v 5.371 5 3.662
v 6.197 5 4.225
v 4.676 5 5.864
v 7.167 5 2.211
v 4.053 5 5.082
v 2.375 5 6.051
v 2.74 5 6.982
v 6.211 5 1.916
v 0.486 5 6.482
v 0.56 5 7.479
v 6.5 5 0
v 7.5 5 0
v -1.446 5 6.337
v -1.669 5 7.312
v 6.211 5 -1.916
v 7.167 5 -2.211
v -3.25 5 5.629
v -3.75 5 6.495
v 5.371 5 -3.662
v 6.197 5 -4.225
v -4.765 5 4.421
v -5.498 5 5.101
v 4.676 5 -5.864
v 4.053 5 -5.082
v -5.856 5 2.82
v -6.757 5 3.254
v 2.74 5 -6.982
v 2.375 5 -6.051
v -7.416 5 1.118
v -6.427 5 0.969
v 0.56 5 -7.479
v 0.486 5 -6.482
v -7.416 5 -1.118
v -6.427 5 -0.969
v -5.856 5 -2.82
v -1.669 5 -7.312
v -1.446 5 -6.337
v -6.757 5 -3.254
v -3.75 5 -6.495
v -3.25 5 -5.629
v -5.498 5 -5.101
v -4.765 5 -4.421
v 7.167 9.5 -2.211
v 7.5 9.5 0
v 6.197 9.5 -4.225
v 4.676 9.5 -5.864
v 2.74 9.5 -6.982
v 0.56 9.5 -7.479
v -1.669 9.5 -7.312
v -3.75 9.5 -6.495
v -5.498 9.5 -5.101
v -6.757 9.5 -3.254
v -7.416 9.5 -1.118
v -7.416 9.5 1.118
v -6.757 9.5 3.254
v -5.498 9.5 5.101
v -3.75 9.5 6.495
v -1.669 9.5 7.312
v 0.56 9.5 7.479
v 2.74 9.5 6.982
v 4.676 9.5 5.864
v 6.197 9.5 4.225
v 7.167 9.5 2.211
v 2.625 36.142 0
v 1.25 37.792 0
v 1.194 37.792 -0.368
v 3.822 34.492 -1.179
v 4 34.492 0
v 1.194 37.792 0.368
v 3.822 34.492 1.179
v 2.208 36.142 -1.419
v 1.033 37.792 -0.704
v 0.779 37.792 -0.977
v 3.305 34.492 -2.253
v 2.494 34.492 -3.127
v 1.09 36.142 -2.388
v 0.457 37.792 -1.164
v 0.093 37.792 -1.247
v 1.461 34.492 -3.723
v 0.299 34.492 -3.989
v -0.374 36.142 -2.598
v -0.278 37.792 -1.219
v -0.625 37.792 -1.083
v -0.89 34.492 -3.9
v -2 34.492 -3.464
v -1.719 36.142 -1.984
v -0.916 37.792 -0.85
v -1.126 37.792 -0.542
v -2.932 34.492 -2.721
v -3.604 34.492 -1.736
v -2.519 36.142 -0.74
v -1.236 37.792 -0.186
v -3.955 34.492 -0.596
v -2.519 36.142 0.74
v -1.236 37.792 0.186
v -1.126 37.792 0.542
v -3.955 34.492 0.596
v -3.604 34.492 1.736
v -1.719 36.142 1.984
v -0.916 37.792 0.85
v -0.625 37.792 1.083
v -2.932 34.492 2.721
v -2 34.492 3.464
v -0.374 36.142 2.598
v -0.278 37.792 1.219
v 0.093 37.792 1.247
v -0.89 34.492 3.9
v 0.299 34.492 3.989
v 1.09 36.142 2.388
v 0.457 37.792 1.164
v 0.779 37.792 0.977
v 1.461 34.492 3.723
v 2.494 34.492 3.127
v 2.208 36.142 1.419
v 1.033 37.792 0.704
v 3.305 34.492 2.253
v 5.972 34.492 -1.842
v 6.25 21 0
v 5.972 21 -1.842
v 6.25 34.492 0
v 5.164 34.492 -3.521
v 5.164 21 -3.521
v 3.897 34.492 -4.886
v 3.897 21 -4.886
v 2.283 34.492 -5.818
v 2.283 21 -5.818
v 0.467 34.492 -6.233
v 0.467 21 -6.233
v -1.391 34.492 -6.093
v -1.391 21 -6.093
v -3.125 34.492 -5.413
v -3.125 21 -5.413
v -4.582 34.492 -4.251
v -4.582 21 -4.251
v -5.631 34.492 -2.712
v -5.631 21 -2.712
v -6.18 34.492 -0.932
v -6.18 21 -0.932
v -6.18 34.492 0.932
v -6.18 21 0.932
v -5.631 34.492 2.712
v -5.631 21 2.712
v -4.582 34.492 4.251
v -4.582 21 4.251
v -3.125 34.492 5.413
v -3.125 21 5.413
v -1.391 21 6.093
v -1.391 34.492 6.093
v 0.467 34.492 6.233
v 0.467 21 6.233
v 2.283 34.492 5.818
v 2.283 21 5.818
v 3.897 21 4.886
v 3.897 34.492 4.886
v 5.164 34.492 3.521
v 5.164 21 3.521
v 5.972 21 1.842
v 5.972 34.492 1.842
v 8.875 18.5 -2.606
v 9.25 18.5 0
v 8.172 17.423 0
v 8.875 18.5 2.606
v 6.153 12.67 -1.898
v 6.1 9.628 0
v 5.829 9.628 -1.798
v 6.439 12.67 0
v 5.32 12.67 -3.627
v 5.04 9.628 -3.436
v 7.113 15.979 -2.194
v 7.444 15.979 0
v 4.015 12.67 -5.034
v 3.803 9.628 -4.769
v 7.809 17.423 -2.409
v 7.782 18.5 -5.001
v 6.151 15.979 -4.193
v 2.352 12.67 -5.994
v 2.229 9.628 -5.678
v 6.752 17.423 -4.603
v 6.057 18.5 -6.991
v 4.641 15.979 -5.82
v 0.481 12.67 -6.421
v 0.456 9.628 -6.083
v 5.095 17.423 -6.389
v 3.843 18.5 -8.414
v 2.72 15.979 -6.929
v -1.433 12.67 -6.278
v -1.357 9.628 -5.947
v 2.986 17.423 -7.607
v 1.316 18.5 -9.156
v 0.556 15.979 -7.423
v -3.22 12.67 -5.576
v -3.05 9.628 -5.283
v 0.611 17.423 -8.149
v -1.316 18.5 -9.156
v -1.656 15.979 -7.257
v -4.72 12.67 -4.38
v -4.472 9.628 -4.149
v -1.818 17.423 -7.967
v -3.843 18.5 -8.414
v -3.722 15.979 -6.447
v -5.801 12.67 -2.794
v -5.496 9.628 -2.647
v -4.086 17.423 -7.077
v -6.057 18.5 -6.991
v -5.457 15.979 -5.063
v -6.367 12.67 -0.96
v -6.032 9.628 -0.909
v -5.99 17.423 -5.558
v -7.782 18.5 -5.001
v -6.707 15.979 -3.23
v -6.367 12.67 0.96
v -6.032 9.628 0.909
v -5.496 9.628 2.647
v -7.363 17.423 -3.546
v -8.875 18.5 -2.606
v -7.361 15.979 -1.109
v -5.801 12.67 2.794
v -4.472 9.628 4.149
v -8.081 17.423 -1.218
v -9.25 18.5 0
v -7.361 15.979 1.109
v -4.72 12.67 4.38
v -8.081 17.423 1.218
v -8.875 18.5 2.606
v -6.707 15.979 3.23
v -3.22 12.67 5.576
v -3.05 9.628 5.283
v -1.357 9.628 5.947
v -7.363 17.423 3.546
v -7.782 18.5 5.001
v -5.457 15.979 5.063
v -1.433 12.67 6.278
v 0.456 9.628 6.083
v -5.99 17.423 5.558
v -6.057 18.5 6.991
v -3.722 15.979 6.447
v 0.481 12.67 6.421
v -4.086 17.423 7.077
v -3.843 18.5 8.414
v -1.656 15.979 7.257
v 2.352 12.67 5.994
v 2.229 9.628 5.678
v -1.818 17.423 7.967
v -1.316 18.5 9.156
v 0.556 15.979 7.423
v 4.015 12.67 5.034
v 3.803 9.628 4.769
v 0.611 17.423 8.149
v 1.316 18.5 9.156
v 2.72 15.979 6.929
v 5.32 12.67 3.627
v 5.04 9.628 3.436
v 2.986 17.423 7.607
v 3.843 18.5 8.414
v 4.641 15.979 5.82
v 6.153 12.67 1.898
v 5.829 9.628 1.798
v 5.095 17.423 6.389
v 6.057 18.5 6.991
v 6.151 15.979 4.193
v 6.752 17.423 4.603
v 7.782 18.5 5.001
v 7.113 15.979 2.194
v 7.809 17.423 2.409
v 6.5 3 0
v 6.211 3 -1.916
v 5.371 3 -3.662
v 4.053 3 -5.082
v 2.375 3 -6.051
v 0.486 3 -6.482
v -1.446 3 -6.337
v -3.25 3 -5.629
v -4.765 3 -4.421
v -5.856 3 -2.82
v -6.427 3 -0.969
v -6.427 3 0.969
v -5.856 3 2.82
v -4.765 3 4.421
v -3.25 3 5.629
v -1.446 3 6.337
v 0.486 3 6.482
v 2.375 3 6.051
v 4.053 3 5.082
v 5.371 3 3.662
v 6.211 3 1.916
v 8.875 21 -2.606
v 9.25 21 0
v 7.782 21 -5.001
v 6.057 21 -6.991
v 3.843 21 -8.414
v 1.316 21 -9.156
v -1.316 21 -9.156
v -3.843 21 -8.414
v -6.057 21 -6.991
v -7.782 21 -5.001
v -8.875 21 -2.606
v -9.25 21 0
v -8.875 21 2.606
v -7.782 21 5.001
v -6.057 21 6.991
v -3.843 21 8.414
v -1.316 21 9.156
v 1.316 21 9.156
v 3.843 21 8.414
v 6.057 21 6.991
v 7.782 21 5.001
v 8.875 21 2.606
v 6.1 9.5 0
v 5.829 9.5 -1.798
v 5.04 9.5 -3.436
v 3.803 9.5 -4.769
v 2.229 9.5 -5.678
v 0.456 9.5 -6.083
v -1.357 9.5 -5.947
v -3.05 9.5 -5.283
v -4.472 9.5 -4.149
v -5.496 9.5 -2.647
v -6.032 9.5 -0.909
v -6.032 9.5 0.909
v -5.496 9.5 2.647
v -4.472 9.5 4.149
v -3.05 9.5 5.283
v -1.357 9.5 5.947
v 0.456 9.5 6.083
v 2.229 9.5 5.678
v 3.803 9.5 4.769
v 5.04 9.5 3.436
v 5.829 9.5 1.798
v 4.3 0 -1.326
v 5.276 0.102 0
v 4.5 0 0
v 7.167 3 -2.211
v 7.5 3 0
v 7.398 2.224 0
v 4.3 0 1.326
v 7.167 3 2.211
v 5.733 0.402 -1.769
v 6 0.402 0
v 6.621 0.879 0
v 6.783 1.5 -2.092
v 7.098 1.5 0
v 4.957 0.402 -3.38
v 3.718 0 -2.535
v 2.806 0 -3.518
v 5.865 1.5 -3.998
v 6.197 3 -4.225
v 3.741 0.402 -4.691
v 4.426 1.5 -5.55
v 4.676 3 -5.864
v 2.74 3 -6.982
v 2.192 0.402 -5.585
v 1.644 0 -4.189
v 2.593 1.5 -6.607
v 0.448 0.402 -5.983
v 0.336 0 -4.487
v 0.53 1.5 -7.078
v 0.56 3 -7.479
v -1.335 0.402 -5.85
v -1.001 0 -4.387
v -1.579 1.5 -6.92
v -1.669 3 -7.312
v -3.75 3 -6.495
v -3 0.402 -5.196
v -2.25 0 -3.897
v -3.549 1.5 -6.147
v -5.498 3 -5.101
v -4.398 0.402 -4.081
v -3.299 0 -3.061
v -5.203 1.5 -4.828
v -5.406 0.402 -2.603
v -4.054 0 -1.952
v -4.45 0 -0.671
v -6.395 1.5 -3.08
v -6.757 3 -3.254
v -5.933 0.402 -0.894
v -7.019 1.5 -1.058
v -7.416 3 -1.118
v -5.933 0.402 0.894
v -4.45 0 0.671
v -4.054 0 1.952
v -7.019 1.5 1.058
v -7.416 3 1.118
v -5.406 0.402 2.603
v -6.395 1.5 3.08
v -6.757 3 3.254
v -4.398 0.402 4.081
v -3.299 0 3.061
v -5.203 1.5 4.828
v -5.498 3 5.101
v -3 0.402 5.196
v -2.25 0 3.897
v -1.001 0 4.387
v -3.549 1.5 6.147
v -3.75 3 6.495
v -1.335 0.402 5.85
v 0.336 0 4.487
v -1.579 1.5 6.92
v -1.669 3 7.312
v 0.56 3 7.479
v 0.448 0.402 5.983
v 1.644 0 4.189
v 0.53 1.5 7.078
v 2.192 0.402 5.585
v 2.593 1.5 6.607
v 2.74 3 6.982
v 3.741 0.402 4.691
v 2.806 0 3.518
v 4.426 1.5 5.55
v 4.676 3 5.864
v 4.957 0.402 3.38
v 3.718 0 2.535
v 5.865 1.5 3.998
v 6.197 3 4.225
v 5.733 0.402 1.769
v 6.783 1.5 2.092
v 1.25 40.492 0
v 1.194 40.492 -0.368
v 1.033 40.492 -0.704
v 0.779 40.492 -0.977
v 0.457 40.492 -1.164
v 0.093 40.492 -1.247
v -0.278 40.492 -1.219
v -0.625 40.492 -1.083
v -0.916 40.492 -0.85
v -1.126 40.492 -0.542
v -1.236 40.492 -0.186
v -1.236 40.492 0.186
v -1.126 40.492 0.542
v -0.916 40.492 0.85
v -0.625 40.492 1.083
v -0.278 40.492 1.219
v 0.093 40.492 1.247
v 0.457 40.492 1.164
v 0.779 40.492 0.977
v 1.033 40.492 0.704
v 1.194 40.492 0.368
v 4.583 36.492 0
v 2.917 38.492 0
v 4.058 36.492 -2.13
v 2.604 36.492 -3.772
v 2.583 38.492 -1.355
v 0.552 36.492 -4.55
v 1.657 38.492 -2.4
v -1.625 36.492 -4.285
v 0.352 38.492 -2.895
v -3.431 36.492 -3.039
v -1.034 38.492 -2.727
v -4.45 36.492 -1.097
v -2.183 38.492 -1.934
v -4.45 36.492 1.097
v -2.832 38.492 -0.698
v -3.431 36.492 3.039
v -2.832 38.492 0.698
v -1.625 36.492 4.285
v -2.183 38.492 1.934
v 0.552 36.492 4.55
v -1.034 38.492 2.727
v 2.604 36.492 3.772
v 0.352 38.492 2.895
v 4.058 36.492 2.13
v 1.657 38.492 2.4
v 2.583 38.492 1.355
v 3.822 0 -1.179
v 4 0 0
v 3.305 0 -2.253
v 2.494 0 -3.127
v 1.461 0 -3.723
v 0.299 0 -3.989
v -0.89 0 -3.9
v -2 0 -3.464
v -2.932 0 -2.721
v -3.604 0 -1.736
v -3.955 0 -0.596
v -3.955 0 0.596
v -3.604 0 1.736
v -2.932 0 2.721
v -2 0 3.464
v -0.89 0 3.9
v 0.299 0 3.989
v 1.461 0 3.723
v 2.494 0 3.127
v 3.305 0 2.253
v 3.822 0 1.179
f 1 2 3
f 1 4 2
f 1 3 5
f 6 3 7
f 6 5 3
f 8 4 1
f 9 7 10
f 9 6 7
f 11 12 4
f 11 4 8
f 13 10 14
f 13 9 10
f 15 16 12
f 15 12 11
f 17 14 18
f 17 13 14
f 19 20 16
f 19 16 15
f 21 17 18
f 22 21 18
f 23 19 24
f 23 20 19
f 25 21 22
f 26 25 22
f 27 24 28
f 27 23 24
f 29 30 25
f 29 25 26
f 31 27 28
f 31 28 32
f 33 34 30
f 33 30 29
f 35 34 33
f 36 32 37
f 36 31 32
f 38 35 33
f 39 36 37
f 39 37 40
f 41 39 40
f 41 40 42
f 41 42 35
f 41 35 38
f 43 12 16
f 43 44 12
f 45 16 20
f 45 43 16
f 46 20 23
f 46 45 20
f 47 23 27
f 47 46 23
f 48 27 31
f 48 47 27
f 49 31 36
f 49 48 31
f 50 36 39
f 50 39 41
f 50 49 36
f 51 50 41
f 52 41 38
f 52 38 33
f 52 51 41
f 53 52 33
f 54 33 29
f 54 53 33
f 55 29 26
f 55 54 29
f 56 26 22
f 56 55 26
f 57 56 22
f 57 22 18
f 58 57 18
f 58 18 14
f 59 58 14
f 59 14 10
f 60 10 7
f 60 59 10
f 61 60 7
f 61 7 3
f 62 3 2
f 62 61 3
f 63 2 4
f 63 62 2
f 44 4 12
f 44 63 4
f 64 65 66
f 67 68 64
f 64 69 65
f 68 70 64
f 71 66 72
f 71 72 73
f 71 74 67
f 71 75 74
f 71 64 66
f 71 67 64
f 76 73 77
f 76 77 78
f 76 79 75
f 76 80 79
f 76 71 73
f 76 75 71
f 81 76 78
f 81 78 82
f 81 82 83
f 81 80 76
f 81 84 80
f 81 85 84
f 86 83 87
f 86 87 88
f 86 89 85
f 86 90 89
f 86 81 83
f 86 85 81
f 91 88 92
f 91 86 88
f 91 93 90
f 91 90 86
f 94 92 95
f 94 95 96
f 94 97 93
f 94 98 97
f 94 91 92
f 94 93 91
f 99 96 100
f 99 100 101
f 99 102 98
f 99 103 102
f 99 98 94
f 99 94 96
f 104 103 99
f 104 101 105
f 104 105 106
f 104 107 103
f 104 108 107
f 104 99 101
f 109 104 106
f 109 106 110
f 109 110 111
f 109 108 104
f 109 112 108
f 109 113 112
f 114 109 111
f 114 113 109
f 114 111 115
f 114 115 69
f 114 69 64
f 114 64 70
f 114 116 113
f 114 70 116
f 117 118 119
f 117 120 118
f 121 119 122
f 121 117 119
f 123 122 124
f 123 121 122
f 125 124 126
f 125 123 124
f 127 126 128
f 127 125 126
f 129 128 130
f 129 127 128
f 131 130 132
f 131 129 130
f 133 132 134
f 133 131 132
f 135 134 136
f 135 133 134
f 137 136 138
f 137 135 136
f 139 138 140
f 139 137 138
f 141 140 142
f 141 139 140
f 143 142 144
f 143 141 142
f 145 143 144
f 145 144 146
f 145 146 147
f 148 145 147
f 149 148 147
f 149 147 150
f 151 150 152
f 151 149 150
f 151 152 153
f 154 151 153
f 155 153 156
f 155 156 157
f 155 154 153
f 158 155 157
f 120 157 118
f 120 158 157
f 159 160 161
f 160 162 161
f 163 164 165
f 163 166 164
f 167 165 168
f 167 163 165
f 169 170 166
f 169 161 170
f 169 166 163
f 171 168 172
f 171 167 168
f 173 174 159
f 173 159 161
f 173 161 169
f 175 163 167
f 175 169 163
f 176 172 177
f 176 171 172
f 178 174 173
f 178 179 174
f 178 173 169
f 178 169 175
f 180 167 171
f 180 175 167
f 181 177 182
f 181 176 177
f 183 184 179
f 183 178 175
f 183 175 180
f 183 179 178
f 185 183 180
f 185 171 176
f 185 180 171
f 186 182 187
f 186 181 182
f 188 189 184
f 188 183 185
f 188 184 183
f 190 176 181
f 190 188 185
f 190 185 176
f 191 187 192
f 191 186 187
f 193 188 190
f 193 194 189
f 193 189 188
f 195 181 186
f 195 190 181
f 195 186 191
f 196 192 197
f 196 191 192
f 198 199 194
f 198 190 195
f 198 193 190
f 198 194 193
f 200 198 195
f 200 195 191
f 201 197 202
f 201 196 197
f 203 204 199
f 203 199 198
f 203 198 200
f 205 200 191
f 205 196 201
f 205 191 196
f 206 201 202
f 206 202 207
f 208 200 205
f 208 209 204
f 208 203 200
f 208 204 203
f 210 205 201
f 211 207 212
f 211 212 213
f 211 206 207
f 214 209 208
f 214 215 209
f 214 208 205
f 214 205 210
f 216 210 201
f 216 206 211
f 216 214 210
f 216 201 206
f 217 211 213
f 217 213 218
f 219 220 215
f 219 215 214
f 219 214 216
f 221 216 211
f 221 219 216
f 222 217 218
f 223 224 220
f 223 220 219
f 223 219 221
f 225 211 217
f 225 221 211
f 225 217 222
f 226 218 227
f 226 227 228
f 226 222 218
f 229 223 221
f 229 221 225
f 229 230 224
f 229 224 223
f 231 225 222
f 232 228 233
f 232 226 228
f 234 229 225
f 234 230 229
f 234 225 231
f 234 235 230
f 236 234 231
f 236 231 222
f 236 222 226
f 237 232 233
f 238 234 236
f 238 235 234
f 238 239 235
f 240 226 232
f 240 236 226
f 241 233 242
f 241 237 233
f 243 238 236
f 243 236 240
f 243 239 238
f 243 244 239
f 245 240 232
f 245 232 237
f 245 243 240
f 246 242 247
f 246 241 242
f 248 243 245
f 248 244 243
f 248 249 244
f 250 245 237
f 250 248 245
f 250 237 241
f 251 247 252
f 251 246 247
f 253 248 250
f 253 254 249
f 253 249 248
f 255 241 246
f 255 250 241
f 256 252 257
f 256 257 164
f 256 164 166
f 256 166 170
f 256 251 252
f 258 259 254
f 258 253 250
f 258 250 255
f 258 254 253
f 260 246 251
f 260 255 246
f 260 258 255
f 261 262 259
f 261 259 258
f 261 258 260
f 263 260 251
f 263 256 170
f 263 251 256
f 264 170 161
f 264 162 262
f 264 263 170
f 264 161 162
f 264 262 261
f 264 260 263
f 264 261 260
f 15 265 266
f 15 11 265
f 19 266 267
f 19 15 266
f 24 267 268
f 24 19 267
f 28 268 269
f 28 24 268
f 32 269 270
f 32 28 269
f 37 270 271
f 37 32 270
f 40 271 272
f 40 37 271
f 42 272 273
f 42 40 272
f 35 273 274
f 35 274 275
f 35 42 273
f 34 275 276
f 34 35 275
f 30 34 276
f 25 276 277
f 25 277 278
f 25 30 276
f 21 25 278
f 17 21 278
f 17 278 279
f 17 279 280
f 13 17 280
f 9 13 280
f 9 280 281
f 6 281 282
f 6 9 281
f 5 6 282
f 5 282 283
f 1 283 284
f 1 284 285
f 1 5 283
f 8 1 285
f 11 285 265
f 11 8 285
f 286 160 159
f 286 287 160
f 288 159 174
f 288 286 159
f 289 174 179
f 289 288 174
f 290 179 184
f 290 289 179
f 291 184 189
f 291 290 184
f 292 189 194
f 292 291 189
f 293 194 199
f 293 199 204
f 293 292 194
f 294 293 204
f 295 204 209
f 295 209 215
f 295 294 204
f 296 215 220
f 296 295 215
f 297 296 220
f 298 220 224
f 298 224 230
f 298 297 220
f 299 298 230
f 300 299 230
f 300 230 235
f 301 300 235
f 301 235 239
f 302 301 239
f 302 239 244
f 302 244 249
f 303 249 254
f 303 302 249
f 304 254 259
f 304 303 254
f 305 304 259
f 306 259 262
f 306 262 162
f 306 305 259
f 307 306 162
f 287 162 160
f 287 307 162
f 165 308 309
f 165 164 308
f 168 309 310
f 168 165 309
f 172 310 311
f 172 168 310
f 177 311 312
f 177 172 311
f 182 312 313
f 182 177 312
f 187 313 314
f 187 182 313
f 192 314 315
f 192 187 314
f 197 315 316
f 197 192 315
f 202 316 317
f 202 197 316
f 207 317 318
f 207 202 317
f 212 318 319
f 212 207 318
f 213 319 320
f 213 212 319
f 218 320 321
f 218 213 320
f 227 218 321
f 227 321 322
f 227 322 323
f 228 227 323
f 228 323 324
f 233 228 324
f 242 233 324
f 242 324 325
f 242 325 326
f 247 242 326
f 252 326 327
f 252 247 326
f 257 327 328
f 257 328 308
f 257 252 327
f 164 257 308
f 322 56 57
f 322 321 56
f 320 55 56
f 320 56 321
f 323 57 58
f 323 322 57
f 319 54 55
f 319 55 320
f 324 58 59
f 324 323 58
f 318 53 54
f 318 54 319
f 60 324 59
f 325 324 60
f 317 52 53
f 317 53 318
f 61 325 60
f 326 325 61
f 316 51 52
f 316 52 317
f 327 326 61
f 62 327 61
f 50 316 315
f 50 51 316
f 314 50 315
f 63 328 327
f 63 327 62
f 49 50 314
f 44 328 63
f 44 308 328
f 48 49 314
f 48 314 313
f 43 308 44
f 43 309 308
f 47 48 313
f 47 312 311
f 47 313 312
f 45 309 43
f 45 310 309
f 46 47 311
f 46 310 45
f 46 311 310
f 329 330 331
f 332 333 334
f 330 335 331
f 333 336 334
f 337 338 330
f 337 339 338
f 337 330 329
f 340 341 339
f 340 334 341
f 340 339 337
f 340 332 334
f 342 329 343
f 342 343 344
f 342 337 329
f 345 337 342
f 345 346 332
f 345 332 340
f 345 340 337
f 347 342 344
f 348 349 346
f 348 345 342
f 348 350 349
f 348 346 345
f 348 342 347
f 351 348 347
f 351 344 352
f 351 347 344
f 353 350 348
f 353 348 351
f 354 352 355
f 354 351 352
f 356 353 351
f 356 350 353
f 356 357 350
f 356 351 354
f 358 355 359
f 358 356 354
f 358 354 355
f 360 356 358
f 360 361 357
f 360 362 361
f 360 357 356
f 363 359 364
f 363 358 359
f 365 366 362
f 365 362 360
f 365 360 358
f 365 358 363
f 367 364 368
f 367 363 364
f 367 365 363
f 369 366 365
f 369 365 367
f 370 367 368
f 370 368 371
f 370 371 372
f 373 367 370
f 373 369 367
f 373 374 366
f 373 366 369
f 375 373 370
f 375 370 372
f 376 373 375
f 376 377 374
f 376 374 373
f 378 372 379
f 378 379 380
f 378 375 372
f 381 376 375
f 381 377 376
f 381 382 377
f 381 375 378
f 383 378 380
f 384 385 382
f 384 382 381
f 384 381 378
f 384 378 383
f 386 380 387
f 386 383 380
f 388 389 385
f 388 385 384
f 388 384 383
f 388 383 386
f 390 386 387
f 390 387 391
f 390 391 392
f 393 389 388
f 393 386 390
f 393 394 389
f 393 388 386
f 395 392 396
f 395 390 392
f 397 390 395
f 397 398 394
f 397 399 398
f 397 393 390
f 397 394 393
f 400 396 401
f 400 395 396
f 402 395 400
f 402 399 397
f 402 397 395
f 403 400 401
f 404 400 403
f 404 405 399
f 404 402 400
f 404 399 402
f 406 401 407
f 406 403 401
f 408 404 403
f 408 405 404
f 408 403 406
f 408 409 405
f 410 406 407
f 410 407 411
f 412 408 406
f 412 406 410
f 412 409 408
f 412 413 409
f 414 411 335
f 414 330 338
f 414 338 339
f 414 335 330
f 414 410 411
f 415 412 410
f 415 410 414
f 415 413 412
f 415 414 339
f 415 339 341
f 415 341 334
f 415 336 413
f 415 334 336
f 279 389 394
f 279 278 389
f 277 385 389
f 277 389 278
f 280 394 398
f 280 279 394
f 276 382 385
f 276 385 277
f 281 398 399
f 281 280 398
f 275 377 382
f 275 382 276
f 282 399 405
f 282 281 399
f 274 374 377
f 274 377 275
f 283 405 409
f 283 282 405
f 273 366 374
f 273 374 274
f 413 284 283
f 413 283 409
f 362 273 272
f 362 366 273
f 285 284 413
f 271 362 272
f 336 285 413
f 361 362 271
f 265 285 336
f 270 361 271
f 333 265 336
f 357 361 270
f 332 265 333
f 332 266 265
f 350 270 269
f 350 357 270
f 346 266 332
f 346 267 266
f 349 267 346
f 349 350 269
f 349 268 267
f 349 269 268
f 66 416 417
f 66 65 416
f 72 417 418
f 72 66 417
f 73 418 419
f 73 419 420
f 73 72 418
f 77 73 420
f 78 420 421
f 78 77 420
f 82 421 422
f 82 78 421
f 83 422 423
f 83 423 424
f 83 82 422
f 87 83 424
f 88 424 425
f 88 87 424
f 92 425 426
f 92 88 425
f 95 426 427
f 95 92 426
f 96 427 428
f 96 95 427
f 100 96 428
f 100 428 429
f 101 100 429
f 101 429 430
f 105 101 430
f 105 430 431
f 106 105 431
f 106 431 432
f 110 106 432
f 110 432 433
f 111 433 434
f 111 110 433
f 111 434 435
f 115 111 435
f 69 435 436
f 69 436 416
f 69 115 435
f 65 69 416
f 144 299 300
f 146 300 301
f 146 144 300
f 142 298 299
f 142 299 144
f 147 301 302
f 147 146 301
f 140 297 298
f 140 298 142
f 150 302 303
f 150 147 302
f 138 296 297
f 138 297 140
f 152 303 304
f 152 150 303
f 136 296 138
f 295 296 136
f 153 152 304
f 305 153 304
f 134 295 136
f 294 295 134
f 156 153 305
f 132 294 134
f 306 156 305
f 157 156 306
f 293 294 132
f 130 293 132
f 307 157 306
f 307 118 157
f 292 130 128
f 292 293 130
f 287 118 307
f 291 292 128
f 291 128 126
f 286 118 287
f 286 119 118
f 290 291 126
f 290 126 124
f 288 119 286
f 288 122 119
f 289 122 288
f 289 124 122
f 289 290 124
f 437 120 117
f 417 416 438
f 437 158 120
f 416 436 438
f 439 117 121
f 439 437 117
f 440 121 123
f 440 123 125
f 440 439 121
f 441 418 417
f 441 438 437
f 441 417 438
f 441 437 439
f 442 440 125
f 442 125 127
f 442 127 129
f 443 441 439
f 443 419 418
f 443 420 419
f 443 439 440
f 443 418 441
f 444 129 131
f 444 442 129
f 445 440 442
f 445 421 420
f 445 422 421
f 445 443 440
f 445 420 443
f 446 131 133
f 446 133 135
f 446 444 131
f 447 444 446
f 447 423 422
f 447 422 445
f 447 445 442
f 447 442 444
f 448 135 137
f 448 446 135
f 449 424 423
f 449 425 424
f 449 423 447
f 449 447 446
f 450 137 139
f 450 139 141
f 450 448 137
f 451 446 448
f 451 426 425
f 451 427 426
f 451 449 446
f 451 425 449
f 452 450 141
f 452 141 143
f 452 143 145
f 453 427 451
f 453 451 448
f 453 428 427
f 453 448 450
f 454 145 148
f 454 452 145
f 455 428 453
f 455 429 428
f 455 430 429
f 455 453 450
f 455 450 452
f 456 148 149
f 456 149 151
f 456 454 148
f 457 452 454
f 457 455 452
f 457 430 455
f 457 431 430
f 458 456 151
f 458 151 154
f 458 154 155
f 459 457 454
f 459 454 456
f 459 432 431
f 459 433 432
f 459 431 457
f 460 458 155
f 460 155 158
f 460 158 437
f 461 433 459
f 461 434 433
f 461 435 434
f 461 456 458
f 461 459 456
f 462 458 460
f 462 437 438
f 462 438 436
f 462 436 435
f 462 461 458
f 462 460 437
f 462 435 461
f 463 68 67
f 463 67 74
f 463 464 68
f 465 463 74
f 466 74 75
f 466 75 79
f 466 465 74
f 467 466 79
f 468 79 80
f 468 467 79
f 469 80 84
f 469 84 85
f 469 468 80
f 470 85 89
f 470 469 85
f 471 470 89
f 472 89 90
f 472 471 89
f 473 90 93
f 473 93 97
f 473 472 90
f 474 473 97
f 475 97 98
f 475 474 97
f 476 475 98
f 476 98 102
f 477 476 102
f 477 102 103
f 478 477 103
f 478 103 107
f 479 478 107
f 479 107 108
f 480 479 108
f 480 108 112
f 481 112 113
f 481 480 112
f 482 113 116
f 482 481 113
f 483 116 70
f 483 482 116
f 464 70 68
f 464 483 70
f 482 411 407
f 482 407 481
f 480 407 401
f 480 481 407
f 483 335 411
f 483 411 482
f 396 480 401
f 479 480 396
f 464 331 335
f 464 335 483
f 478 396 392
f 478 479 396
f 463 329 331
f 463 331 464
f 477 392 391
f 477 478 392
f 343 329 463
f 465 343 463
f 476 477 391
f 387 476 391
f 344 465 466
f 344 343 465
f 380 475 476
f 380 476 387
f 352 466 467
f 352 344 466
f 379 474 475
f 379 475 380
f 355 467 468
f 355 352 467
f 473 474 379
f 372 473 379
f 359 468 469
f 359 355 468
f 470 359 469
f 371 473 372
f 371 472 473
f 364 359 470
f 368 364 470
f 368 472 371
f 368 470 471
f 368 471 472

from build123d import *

# Parameters (mm, degrees)
F0_W = 2.25
F0_H = 10.4924628735
F2_R = 2.99999


# Not quite as in the source:
# - a fillet or chamfer is up to 0.001 mm smaller than in the source, because OpenCascade refuses the exact size


with BuildPart() as f1:
    # F0 (on Top) → F1 (revolve)
    with BuildSketch(Plane.XY):
        with BuildLine():
            Line((4, 10), (4, 0))
            Line((4, 0), (7.5, 0))
            Line((7.5, 0), (7.5, 3))
            Line((7.5, 3), (6.5, 3))
            Line((6.5, 3), (6.5, 5))
            Line((6.5, 5), (7.5, 5))
            Line((7.5, 5), (7.5, 9.5))
            Line((7.5, 9.5), (6.1, 9.5))
            add(Edge.make_bspline(
                [(6.1, 9.5), (6.0997806749, 9.542689319), (6.0997821122, 9.585377965), (6.1, 9.6280611679)],
                knots=[0, 0, 0, 0, 0.0093487262, 0.0093487262, 0.0093487262, 0.0093487262], degree=3))
            add(Edge.make_bspline(
                [(6.1, 9.6280611679), (6.1147869444, 12.5247545063), (7.6944598018, 17.0085980566), (8.4188714562, 17.7962221352), (9.25, 18.5)],
                knots=[0.0093487262, 0.0093487262, 0.0093487262, 0.0093487262, 0.6437995433, 1, 1, 1, 1], degree=3))
            Line((9.25, 18.5), (9.25, 21))
            Line((9.25, 21), (6.25, 21))
            Line((6.25, 21), (6.25, 24))
            Line((6.25, 24), (4, 24))
            Line((4, 24), (4, 10))
        make_face()
        with Locations((5.125, 29.2462314367)):
            Rectangle(F0_W, F0_H)
        Polygon((1.25, 37.7924628735), (4, 34.4924628735), (6.25, 34.4924628735), (1.25, 40.4924628735), align=None)
        with BuildLine():
            Line((6.1, 9.5), (6.1, 9.6280611679))
            add(Edge.make_bspline(
                [(6.1, 9.5), (6.0997806749, 9.542689319), (6.0997821122, 9.585377965), (6.1, 9.6280611679)],
                knots=[0, 0, 0, 0, 0.0093487262, 0.0093487262, 0.0093487262, 0.0093487262], degree=3))
        make_face()
    revolve(axis=Axis((0, 14.3348099664, 0), (0, 1, 0)))

    # F2 (radius 3 in the source; OpenCascade refuses exactly that, so slightly less here)
    f2_edges = [f1.edges().sort_by_distance(p)[0] for p in [
        (-7.5, 0, 0),
    ]]
    fillet(f2_edges, radius=F2_R)


solid = f1.part
